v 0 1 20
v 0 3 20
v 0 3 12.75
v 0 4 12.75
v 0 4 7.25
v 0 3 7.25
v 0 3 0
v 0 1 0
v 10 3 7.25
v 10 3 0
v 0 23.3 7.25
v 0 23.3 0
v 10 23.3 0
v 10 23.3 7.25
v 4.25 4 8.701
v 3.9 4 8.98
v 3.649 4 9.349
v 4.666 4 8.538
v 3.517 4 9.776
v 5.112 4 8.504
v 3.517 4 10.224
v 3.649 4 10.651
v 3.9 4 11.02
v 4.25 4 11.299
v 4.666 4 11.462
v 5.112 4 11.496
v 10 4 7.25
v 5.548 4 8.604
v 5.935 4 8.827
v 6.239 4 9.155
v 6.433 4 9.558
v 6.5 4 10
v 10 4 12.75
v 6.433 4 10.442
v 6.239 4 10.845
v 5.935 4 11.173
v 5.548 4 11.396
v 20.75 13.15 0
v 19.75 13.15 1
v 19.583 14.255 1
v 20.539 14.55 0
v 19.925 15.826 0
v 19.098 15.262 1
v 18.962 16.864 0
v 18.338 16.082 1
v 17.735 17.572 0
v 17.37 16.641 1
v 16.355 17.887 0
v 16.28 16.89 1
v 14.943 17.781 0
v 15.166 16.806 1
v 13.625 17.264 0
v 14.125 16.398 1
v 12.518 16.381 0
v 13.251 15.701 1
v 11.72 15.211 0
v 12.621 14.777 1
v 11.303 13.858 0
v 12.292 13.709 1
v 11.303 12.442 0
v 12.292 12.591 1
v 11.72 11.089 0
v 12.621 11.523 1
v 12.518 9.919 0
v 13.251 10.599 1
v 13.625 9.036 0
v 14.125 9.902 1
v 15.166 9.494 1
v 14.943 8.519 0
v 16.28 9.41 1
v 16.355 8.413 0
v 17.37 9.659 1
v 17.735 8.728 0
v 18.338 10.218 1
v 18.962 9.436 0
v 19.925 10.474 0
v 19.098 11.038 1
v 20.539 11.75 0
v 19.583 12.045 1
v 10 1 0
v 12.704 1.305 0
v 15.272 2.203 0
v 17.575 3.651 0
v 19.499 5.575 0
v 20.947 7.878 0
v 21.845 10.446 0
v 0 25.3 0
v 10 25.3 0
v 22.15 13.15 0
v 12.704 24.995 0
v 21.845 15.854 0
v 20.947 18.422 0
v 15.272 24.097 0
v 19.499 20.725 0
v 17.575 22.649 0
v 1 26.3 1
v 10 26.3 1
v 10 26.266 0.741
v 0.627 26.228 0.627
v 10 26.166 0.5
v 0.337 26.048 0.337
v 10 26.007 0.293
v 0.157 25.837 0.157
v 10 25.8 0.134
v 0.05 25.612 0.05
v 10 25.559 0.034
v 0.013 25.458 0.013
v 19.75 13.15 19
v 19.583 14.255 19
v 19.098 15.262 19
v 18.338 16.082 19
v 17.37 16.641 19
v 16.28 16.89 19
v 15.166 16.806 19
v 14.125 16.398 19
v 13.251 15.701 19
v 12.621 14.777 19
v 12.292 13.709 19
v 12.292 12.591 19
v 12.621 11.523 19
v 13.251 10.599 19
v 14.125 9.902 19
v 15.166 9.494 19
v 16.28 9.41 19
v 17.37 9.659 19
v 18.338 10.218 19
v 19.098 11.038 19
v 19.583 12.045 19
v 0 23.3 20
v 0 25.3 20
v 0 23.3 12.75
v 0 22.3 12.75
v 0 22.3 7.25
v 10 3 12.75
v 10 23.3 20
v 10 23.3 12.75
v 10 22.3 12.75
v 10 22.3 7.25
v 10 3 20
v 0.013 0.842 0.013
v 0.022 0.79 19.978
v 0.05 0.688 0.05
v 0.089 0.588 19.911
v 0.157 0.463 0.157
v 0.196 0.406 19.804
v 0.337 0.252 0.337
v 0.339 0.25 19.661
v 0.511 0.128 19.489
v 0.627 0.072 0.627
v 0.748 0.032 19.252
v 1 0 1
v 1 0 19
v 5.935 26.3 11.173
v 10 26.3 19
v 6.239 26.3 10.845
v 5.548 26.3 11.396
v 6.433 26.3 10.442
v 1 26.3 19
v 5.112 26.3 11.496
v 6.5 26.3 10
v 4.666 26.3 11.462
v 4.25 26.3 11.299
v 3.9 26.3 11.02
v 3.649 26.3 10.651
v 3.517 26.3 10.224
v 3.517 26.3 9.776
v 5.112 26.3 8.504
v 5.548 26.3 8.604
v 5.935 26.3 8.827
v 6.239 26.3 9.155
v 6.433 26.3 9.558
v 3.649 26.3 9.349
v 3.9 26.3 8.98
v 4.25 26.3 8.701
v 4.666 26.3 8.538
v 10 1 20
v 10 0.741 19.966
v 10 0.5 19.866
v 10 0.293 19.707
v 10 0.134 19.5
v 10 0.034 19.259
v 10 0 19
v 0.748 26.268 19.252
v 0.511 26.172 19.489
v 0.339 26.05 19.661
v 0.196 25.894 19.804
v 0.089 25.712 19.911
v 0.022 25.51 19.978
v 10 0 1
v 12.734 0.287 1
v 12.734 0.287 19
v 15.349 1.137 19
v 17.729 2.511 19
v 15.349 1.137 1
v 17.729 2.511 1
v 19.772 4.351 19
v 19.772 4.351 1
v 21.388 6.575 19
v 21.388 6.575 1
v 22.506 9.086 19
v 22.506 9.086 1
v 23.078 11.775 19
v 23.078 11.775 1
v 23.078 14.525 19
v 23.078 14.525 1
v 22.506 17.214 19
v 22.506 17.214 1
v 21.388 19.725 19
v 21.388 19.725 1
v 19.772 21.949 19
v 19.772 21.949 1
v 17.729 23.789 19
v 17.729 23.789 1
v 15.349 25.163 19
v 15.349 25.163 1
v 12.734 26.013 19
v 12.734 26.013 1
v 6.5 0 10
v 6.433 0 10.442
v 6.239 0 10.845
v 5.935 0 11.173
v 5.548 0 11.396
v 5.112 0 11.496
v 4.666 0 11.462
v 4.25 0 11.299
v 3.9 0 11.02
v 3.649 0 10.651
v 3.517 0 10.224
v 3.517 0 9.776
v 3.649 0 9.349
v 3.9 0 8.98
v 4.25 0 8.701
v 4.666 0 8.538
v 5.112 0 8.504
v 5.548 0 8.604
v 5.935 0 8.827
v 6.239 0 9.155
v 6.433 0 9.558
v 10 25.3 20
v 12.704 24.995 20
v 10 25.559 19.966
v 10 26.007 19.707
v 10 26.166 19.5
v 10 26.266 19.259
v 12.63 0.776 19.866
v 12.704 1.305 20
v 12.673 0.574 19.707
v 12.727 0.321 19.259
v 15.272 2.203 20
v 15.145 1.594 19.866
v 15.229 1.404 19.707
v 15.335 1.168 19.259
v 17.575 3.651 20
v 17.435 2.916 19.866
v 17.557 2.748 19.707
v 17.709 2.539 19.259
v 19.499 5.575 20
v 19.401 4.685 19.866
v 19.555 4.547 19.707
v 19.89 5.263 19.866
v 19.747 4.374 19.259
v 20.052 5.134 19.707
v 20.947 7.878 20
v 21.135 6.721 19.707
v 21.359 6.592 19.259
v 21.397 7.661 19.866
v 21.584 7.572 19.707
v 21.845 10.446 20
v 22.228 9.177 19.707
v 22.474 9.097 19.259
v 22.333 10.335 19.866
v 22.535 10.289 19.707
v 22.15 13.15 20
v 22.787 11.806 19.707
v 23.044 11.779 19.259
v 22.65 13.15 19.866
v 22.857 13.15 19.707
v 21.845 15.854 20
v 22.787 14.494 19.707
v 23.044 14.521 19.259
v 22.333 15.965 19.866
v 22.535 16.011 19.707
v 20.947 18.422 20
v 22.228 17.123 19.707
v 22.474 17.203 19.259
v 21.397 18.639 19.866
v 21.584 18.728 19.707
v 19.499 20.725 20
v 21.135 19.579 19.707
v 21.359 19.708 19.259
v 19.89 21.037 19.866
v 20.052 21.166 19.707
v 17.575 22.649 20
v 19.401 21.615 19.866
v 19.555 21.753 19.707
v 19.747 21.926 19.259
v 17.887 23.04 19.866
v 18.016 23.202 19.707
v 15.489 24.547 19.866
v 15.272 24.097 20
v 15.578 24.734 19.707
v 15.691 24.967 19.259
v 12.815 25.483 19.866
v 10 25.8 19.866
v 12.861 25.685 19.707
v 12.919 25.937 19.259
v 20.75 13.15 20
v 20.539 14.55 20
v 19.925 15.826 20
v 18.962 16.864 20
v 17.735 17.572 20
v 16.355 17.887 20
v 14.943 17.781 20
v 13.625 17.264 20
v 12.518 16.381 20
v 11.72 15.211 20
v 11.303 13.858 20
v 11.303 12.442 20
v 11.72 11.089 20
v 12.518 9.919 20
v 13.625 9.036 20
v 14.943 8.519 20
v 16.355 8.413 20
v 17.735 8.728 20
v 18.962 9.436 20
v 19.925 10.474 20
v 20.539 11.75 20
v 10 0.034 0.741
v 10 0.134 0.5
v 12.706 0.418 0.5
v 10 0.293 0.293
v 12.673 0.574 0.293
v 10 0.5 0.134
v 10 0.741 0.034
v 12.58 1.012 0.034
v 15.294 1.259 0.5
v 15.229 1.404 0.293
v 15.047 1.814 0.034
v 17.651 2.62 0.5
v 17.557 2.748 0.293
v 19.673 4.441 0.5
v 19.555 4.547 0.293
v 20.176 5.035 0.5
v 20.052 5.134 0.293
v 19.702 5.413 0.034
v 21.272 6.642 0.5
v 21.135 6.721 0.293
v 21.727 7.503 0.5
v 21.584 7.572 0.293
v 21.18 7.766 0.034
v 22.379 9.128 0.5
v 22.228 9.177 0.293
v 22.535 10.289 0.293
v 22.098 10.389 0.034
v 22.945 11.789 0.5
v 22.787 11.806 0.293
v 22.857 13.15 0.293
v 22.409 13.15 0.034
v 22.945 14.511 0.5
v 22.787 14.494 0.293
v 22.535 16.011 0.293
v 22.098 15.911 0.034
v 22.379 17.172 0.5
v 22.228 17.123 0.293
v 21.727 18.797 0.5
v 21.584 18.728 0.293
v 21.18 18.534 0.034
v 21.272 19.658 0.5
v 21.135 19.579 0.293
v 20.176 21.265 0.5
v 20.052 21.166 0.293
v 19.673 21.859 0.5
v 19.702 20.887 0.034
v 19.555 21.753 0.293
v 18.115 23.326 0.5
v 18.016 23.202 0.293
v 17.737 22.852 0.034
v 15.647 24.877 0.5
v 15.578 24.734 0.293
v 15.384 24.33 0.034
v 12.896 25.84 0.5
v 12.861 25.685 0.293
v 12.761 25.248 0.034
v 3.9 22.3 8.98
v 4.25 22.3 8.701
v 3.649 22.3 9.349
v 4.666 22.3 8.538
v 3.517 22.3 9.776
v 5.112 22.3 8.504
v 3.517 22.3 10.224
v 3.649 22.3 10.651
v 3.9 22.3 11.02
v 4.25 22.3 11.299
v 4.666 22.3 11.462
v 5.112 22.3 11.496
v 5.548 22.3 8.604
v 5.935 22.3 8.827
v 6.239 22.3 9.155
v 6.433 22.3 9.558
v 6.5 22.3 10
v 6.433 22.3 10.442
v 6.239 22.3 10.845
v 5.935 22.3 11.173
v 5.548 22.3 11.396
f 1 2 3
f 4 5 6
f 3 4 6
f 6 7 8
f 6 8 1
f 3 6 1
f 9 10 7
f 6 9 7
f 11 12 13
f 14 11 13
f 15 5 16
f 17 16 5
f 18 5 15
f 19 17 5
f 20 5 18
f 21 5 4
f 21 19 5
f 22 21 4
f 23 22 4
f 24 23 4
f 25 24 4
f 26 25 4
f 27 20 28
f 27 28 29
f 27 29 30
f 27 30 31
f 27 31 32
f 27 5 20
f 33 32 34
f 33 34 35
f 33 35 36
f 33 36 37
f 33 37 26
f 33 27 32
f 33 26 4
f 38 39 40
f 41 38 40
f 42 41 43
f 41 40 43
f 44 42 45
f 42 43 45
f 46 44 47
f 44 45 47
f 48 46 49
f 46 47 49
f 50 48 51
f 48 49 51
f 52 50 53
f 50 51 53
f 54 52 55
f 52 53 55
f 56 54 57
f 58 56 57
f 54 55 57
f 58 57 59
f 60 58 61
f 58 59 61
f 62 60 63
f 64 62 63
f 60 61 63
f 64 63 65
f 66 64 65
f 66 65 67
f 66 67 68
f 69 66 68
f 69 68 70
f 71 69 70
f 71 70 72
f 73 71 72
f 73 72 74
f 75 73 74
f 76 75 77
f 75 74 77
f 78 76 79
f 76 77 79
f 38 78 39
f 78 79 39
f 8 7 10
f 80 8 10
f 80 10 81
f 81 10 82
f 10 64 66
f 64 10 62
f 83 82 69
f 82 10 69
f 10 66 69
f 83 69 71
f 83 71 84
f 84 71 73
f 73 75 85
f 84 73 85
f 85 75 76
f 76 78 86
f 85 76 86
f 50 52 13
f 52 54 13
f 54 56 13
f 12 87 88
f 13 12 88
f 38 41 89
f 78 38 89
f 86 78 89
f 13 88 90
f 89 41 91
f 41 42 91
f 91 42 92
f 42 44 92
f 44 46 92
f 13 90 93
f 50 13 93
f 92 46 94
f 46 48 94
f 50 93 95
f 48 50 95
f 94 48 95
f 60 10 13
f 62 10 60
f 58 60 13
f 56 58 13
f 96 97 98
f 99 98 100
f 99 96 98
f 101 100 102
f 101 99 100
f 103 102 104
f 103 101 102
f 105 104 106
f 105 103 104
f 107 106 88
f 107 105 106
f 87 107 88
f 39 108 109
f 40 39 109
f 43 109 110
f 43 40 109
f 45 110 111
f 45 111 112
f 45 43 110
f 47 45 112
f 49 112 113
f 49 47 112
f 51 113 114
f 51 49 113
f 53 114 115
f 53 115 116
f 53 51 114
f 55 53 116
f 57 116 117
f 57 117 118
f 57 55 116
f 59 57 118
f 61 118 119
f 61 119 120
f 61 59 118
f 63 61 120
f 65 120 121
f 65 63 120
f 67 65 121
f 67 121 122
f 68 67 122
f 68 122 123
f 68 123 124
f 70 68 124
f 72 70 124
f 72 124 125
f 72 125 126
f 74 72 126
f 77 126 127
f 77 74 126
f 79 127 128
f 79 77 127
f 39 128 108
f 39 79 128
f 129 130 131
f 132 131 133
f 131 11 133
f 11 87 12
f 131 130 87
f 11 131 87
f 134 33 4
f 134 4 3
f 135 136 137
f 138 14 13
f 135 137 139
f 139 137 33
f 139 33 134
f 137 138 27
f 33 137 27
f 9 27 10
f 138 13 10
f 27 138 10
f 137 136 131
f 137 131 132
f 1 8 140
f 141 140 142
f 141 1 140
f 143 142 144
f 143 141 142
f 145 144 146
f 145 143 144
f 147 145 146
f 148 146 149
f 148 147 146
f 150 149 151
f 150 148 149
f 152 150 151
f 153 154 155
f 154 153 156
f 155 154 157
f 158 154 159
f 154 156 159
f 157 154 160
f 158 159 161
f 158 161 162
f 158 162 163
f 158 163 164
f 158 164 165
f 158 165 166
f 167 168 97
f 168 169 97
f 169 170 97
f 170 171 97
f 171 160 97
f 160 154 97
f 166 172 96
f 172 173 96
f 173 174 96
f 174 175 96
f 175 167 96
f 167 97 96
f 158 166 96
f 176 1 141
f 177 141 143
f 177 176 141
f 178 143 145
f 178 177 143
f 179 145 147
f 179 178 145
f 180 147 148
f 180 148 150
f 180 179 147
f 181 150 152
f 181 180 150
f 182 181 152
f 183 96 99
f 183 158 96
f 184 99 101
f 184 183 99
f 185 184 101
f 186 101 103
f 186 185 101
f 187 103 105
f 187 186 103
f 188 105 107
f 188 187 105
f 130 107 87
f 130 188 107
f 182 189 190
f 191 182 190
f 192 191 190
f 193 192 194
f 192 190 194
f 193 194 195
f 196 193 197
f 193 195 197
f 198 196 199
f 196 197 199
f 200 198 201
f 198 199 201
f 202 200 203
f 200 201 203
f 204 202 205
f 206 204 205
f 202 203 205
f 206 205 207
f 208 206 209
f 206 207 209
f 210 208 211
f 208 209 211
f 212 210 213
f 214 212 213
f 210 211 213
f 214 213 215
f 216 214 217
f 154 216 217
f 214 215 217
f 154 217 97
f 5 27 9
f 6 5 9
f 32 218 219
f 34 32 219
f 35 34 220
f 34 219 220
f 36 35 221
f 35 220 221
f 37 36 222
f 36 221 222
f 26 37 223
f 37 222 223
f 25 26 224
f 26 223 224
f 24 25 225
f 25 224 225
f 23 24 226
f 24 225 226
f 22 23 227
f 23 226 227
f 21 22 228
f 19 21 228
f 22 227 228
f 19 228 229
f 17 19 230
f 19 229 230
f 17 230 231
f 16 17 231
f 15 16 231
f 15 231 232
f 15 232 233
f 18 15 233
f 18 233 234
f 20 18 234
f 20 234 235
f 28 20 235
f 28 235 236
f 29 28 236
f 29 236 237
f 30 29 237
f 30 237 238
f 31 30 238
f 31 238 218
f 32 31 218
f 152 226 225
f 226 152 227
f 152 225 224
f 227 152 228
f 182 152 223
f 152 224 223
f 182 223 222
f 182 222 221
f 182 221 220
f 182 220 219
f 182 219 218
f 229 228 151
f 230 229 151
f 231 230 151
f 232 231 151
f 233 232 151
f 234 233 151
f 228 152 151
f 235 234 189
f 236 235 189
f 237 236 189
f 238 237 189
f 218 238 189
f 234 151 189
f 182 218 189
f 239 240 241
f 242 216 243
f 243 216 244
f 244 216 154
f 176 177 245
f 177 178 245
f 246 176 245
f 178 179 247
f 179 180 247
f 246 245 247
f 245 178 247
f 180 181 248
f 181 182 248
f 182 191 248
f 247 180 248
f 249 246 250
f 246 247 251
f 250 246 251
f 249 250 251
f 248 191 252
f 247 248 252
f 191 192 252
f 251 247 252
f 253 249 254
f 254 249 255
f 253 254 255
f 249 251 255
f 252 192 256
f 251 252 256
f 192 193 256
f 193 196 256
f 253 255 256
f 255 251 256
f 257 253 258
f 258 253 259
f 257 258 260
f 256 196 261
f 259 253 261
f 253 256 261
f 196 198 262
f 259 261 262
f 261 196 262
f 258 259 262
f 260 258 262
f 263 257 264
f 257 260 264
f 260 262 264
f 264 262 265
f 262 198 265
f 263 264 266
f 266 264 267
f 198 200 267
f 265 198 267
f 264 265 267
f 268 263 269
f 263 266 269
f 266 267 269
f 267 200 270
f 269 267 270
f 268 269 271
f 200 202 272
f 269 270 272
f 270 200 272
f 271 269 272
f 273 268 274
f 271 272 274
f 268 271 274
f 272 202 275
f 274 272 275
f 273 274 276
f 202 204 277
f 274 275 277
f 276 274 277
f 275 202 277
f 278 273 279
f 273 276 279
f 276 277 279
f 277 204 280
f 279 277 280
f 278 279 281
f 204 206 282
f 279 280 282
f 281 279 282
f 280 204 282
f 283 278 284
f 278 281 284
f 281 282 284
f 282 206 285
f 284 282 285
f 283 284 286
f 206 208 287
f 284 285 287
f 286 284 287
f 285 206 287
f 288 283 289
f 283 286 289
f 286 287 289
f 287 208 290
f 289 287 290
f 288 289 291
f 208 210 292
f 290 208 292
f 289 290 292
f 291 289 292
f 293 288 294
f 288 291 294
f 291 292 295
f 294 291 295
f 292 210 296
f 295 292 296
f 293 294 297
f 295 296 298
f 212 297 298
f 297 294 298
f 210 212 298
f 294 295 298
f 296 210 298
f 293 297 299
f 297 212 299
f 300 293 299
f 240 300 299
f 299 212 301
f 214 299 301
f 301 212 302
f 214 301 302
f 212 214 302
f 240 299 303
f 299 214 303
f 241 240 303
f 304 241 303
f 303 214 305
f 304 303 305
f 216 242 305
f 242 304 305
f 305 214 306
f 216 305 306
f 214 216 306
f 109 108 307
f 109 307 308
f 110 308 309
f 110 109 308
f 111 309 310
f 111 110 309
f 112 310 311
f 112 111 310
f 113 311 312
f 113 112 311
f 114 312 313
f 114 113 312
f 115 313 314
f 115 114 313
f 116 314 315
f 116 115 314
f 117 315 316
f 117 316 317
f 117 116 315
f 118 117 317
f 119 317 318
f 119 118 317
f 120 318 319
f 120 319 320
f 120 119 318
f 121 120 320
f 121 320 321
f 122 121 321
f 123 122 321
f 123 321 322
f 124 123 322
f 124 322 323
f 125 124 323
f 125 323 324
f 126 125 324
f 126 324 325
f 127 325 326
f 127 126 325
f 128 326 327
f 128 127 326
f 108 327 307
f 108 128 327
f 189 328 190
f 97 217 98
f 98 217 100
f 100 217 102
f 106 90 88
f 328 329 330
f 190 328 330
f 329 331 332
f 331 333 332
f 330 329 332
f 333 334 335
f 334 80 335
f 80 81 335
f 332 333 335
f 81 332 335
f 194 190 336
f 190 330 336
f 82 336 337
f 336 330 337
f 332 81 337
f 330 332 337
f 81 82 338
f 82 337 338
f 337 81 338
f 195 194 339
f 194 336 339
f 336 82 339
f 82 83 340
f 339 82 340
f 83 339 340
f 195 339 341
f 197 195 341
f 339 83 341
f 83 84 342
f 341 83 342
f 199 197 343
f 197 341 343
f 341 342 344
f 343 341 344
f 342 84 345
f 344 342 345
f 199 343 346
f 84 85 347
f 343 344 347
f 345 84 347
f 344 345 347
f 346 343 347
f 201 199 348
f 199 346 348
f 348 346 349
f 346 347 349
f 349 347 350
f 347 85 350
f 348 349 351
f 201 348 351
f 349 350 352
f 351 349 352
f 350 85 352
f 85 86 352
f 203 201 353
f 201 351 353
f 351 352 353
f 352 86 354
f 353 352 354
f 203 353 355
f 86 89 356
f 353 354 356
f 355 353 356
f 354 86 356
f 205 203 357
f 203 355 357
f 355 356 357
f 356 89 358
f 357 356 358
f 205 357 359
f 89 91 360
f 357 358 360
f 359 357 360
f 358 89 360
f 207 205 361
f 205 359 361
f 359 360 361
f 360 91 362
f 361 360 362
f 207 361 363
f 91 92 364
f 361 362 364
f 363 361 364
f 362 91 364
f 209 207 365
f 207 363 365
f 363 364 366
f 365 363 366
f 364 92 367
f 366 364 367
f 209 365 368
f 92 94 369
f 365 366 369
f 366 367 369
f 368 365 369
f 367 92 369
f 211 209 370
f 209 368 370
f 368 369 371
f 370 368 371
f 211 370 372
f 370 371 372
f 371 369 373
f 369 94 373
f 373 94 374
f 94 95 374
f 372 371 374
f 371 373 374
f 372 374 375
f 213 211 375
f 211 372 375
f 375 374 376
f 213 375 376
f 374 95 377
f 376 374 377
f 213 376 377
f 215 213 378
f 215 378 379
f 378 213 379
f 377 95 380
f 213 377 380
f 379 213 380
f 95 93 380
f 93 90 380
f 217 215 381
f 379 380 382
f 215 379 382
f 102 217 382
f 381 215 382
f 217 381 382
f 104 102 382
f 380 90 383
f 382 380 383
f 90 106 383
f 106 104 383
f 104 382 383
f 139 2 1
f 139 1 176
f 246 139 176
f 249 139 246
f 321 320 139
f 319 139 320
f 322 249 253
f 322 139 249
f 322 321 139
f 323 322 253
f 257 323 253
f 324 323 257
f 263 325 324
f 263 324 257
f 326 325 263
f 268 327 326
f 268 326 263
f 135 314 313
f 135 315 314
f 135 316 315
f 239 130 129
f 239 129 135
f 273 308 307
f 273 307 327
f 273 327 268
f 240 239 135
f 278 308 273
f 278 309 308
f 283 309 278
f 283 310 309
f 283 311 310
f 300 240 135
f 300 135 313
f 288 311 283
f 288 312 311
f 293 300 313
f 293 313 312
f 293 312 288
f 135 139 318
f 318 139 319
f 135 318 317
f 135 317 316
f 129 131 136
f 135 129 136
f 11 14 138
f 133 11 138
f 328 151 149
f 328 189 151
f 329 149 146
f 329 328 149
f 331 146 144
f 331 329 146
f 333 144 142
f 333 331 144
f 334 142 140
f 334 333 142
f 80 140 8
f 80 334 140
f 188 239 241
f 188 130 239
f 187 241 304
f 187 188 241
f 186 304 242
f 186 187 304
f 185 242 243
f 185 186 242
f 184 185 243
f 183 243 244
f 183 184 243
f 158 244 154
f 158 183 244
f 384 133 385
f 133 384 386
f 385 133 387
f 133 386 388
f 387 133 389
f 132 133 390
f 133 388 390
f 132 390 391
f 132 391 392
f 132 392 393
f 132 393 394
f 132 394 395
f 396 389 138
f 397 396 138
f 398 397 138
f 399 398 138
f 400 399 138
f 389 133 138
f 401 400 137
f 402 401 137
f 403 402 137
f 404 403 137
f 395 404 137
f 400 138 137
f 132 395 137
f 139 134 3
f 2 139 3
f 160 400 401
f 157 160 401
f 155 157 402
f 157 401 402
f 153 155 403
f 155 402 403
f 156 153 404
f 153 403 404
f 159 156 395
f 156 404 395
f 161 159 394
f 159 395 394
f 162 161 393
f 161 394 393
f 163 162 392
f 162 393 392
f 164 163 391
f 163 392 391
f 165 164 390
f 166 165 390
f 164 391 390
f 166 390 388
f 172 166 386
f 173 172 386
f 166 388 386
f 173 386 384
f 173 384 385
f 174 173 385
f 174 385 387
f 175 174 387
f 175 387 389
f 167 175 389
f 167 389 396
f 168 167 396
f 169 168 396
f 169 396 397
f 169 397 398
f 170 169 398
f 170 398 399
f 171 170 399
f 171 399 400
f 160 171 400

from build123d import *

# Parameters (mm, degrees)
F0_R     = 3.75
F1_DEPTH = 20
F2_W     = 1
F2_H     = 5.5
F3_DEPTH = 10
F4_R     = 1.5
F5_DEPTH = 26.301
F6_SIZE  = 1
F7_R     = 1


with BuildPart() as f1:
    # F0 (on Top) → F1 (new body)
    with BuildSketch(Plane.XY):
        with BuildLine():
            Line((0, 3), (0, 0))
            Line((0, 0), (10, 0))
            ThreePointArc((10, 0), (23.15, 13.15), (10, 26.3))
            Line((10, 26.3), (0, 26.3))
            Line((0, 26.3), (0, 23.3))
            Line((0, 23.3), (10, 23.3))
            Line((10, 23.3), (10, 3))
            Line((10, 3), (0, 3))
        make_face()
        with Locations((16, 13.15)):
            Circle(F0_R, mode=Mode.SUBTRACT)
    extrude(amount=F1_DEPTH)

    # F2 (on face) → F3 (join, through all)
    with BuildSketch(Plane(origin=(10, 0, 0), x_dir=(0, -1, 0), z_dir=(-1, 0, 0))):
        with Locations((-22.8, 10)):
            Rectangle(F2_W, F2_H)
        with Locations((-3.5, 10)):
            Rectangle(F2_W, F2_H)
    extrude(amount=F3_DEPTH)

    # F4 (on face) → F5 (cut, through all)
    with BuildSketch(Plane.XZ):
        with Locations((5, 10)):
            Circle(F4_R)
    extrude(amount=-F5_DEPTH, mode=Mode.SUBTRACT)

    # F6
    f6_edges = [f1.edges().sort_by_distance(p)[0] for p in [
        (12.25, 13.15, 20),
        (12.25, 13.15, 0),
    ]]
    chamfer(f6_edges, length=F6_SIZE)

    # F7
    f7_edges = [f1.edges().sort_by_distance(p)[0] for p in [
        (23.15, 13.15, 20),
        (23.15, 13.15, 0),
        (0, 0, 10),
        (0, 26.3, 10),
    ]]
    fillet(f7_edges, radius=F7_R)


solid = f1.part
